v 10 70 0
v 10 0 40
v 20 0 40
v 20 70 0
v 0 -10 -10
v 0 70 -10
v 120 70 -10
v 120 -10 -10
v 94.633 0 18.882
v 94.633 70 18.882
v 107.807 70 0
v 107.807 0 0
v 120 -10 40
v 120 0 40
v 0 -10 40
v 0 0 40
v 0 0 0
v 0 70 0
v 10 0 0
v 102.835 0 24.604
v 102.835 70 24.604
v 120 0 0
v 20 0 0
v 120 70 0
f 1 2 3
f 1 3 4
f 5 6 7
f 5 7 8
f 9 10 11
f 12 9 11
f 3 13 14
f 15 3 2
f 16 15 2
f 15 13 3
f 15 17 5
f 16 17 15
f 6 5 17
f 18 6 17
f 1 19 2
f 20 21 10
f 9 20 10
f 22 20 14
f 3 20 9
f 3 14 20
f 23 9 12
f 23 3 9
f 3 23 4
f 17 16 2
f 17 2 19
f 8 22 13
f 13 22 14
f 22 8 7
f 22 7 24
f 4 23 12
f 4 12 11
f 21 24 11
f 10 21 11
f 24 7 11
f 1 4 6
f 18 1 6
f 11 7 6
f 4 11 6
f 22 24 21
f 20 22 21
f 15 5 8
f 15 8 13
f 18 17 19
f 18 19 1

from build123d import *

# Parameters (mm, degrees)
EXTRUDE_1_DEPTH = 120
EXTRUDE_2_REACH = 151.666
EXTRUDE_3_DEPTH = 10


with BuildPart() as part:
    # 草圖1 → 填料-伸長1 (new body)
    with BuildSketch(Plane(origin=(0, 0, 0), x_dir=(0, 0, -1), z_dir=(1, 0, 0))):
        Polygon((-40, 0), (0, 0), (0, 70), (10, 70), (10, -10), (-40, -10), align=None)
    extrude(amount=EXTRUDE_1_DEPTH)

    # 草圖2 → 填料-伸長2 (add, up to next)
    with BuildSketch(Plane(origin=(0, 70, 0), x_dir=(1, 0, 0), z_dir=(0, 1, 0)), mode=Mode.PRIVATE) as extrude_2_sk1:
        Polygon((120, 0), (102.834521938, -24.603787572), (94.633259414, -18.881961552), (107.806755398, 0), align=None)
    extrude_2_tool1 = extrude(extrude_2_sk1.sketch, amount=-EXTRUDE_2_REACH, mode=Mode.PRIVATE) - part.part
    add(extrude_2_tool1.solids().sort_by_distance((106.542259, 70, 10.934177))[0])

    # 草圖3 → 填料-伸長3 (add)
    with BuildSketch(Plane(origin=(10, 0, 0), x_dir=(0, 0, -1), z_dir=(1, 0, 0))):
        Polygon((0, 70), (0, 0), (-40, 0), align=None)
    extrude(amount=EXTRUDE_3_DEPTH)


solid = part.part
